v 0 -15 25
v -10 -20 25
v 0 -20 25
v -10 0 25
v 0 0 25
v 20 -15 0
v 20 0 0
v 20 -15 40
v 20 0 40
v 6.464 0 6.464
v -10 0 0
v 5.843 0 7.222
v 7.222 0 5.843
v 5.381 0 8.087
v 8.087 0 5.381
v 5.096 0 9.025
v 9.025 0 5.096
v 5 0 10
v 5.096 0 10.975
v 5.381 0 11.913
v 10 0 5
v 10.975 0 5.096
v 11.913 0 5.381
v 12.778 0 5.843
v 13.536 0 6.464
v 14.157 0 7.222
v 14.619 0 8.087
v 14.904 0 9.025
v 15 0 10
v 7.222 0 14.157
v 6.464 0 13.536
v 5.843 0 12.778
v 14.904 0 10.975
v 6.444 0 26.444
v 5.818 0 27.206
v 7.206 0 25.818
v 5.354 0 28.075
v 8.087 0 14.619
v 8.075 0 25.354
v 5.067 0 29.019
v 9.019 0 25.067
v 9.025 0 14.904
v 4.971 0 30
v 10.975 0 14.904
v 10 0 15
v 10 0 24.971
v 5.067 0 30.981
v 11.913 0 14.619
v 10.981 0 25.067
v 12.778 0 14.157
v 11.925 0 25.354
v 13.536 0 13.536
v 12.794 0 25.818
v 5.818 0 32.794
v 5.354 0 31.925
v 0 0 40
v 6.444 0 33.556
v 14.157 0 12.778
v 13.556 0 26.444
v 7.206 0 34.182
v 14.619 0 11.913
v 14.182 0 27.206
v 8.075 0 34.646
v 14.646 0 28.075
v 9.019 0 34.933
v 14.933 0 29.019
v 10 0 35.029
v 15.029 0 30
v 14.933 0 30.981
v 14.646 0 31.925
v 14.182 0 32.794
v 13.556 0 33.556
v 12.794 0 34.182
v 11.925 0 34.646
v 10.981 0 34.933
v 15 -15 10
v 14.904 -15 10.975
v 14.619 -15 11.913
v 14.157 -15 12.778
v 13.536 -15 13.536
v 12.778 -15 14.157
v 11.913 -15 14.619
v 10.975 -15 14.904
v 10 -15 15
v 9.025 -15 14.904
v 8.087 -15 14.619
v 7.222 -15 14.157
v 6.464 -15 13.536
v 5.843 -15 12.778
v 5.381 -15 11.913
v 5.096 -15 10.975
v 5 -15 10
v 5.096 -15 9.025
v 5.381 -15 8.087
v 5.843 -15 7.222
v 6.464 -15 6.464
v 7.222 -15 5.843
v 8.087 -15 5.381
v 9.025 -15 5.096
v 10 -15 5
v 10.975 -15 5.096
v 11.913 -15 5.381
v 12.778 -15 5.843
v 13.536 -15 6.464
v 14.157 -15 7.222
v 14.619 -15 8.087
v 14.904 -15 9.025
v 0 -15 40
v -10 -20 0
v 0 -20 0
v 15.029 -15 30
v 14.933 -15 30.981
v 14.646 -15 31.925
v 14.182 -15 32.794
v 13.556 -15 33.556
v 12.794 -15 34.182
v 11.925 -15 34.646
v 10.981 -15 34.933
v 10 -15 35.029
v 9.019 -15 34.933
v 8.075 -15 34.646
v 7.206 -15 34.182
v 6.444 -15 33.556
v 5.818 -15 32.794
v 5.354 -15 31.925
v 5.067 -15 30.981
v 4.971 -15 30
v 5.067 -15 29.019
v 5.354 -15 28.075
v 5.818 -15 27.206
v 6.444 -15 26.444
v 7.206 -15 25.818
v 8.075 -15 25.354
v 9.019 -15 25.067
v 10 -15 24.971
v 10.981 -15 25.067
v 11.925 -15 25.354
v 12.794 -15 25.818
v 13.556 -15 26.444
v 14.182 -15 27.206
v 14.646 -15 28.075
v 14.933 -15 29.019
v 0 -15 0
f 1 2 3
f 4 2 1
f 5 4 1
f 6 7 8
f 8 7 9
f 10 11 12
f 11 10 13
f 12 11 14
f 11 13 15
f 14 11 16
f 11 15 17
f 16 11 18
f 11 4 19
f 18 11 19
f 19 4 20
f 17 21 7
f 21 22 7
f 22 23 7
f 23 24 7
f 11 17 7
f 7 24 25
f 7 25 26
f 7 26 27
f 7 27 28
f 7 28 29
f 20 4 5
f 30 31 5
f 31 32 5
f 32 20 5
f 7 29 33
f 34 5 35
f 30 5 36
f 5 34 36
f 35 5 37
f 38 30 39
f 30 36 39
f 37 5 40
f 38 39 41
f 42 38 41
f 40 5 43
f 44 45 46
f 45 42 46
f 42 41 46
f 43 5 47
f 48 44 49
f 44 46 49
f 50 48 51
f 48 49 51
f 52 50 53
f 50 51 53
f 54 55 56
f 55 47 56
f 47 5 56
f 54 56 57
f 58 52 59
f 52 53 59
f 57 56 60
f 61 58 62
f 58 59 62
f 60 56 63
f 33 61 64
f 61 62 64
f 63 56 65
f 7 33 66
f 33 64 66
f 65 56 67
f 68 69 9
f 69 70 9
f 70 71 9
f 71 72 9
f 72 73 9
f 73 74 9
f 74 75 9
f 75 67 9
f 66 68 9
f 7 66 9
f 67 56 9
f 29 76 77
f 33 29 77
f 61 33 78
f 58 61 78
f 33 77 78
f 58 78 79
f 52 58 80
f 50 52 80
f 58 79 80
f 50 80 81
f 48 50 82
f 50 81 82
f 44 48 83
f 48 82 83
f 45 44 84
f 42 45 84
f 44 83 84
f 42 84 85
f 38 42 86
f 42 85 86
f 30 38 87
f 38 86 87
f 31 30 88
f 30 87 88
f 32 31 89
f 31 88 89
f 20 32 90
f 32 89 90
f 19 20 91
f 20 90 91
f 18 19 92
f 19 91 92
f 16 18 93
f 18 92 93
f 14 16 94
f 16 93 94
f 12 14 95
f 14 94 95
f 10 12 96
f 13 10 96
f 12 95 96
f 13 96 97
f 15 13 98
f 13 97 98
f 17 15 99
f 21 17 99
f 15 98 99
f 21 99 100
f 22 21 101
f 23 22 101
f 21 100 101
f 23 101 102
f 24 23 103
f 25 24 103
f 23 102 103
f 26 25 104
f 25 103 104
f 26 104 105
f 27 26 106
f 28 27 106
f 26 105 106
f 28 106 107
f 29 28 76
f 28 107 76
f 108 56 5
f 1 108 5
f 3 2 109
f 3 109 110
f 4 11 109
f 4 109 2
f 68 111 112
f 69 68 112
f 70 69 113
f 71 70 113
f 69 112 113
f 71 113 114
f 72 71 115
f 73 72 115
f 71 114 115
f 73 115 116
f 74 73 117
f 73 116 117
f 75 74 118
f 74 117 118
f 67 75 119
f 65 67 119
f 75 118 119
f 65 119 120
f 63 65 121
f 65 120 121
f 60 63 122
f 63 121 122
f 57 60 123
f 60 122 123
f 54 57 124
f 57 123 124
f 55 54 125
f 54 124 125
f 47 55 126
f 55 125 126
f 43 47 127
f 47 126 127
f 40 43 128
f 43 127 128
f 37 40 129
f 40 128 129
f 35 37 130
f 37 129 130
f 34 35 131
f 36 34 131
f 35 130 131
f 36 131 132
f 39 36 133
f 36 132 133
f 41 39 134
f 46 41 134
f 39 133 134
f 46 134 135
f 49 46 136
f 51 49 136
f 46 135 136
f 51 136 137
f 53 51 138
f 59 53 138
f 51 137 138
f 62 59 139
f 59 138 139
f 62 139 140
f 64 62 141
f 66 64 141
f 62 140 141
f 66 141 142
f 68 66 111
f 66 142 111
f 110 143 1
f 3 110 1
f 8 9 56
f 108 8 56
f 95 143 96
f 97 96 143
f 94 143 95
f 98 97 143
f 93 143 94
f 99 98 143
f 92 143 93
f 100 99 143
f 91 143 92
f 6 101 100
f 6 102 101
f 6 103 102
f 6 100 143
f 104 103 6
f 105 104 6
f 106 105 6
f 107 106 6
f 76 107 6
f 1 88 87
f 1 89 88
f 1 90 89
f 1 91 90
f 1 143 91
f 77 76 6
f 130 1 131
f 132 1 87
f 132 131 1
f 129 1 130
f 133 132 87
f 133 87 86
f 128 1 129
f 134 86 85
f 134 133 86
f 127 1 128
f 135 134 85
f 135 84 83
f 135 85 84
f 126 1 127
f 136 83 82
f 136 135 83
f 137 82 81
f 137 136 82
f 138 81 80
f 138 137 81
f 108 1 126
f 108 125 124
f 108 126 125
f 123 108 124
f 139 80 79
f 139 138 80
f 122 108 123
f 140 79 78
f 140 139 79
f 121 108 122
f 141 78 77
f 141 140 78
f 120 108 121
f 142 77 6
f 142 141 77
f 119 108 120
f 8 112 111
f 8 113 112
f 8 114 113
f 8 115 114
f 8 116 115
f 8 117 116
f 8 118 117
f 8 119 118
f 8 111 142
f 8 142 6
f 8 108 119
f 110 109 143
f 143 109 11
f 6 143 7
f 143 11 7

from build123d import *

# Parameters (mm, degrees)
F1_DEPTH = 15
F0_W     = 10
F0_H     = 25
F2_DEPTH = 20
F3_R     = 5
F3_R_2   = 5.029307
F4_DEPTH = 15


with BuildPart() as f1:
    # F0 (on Front) → F1 (new body)
    with BuildSketch(Plane.XZ):
        Polygon((0, 25), (0, 0), (20, 0), (20, 40), (0, 40), align=None)
    extrude(amount=F1_DEPTH)

    # F0 (on Front) → F2 (join)
    with BuildSketch(Plane.XZ):
        with Locations((-5, 12.5)):
            Rectangle(F0_W, F0_H)
    extrude(amount=F2_DEPTH)

    # F3 (on face) → F4 (cut)
    with BuildSketch(Plane.XZ.offset(15)):
        with Locations((10, 10)):
            Circle(F3_R)
        with Locations((10, 30)):
            Circle(F3_R_2)
    extrude(amount=-F4_DEPTH, mode=Mode.SUBTRACT)


solid = f1.part
